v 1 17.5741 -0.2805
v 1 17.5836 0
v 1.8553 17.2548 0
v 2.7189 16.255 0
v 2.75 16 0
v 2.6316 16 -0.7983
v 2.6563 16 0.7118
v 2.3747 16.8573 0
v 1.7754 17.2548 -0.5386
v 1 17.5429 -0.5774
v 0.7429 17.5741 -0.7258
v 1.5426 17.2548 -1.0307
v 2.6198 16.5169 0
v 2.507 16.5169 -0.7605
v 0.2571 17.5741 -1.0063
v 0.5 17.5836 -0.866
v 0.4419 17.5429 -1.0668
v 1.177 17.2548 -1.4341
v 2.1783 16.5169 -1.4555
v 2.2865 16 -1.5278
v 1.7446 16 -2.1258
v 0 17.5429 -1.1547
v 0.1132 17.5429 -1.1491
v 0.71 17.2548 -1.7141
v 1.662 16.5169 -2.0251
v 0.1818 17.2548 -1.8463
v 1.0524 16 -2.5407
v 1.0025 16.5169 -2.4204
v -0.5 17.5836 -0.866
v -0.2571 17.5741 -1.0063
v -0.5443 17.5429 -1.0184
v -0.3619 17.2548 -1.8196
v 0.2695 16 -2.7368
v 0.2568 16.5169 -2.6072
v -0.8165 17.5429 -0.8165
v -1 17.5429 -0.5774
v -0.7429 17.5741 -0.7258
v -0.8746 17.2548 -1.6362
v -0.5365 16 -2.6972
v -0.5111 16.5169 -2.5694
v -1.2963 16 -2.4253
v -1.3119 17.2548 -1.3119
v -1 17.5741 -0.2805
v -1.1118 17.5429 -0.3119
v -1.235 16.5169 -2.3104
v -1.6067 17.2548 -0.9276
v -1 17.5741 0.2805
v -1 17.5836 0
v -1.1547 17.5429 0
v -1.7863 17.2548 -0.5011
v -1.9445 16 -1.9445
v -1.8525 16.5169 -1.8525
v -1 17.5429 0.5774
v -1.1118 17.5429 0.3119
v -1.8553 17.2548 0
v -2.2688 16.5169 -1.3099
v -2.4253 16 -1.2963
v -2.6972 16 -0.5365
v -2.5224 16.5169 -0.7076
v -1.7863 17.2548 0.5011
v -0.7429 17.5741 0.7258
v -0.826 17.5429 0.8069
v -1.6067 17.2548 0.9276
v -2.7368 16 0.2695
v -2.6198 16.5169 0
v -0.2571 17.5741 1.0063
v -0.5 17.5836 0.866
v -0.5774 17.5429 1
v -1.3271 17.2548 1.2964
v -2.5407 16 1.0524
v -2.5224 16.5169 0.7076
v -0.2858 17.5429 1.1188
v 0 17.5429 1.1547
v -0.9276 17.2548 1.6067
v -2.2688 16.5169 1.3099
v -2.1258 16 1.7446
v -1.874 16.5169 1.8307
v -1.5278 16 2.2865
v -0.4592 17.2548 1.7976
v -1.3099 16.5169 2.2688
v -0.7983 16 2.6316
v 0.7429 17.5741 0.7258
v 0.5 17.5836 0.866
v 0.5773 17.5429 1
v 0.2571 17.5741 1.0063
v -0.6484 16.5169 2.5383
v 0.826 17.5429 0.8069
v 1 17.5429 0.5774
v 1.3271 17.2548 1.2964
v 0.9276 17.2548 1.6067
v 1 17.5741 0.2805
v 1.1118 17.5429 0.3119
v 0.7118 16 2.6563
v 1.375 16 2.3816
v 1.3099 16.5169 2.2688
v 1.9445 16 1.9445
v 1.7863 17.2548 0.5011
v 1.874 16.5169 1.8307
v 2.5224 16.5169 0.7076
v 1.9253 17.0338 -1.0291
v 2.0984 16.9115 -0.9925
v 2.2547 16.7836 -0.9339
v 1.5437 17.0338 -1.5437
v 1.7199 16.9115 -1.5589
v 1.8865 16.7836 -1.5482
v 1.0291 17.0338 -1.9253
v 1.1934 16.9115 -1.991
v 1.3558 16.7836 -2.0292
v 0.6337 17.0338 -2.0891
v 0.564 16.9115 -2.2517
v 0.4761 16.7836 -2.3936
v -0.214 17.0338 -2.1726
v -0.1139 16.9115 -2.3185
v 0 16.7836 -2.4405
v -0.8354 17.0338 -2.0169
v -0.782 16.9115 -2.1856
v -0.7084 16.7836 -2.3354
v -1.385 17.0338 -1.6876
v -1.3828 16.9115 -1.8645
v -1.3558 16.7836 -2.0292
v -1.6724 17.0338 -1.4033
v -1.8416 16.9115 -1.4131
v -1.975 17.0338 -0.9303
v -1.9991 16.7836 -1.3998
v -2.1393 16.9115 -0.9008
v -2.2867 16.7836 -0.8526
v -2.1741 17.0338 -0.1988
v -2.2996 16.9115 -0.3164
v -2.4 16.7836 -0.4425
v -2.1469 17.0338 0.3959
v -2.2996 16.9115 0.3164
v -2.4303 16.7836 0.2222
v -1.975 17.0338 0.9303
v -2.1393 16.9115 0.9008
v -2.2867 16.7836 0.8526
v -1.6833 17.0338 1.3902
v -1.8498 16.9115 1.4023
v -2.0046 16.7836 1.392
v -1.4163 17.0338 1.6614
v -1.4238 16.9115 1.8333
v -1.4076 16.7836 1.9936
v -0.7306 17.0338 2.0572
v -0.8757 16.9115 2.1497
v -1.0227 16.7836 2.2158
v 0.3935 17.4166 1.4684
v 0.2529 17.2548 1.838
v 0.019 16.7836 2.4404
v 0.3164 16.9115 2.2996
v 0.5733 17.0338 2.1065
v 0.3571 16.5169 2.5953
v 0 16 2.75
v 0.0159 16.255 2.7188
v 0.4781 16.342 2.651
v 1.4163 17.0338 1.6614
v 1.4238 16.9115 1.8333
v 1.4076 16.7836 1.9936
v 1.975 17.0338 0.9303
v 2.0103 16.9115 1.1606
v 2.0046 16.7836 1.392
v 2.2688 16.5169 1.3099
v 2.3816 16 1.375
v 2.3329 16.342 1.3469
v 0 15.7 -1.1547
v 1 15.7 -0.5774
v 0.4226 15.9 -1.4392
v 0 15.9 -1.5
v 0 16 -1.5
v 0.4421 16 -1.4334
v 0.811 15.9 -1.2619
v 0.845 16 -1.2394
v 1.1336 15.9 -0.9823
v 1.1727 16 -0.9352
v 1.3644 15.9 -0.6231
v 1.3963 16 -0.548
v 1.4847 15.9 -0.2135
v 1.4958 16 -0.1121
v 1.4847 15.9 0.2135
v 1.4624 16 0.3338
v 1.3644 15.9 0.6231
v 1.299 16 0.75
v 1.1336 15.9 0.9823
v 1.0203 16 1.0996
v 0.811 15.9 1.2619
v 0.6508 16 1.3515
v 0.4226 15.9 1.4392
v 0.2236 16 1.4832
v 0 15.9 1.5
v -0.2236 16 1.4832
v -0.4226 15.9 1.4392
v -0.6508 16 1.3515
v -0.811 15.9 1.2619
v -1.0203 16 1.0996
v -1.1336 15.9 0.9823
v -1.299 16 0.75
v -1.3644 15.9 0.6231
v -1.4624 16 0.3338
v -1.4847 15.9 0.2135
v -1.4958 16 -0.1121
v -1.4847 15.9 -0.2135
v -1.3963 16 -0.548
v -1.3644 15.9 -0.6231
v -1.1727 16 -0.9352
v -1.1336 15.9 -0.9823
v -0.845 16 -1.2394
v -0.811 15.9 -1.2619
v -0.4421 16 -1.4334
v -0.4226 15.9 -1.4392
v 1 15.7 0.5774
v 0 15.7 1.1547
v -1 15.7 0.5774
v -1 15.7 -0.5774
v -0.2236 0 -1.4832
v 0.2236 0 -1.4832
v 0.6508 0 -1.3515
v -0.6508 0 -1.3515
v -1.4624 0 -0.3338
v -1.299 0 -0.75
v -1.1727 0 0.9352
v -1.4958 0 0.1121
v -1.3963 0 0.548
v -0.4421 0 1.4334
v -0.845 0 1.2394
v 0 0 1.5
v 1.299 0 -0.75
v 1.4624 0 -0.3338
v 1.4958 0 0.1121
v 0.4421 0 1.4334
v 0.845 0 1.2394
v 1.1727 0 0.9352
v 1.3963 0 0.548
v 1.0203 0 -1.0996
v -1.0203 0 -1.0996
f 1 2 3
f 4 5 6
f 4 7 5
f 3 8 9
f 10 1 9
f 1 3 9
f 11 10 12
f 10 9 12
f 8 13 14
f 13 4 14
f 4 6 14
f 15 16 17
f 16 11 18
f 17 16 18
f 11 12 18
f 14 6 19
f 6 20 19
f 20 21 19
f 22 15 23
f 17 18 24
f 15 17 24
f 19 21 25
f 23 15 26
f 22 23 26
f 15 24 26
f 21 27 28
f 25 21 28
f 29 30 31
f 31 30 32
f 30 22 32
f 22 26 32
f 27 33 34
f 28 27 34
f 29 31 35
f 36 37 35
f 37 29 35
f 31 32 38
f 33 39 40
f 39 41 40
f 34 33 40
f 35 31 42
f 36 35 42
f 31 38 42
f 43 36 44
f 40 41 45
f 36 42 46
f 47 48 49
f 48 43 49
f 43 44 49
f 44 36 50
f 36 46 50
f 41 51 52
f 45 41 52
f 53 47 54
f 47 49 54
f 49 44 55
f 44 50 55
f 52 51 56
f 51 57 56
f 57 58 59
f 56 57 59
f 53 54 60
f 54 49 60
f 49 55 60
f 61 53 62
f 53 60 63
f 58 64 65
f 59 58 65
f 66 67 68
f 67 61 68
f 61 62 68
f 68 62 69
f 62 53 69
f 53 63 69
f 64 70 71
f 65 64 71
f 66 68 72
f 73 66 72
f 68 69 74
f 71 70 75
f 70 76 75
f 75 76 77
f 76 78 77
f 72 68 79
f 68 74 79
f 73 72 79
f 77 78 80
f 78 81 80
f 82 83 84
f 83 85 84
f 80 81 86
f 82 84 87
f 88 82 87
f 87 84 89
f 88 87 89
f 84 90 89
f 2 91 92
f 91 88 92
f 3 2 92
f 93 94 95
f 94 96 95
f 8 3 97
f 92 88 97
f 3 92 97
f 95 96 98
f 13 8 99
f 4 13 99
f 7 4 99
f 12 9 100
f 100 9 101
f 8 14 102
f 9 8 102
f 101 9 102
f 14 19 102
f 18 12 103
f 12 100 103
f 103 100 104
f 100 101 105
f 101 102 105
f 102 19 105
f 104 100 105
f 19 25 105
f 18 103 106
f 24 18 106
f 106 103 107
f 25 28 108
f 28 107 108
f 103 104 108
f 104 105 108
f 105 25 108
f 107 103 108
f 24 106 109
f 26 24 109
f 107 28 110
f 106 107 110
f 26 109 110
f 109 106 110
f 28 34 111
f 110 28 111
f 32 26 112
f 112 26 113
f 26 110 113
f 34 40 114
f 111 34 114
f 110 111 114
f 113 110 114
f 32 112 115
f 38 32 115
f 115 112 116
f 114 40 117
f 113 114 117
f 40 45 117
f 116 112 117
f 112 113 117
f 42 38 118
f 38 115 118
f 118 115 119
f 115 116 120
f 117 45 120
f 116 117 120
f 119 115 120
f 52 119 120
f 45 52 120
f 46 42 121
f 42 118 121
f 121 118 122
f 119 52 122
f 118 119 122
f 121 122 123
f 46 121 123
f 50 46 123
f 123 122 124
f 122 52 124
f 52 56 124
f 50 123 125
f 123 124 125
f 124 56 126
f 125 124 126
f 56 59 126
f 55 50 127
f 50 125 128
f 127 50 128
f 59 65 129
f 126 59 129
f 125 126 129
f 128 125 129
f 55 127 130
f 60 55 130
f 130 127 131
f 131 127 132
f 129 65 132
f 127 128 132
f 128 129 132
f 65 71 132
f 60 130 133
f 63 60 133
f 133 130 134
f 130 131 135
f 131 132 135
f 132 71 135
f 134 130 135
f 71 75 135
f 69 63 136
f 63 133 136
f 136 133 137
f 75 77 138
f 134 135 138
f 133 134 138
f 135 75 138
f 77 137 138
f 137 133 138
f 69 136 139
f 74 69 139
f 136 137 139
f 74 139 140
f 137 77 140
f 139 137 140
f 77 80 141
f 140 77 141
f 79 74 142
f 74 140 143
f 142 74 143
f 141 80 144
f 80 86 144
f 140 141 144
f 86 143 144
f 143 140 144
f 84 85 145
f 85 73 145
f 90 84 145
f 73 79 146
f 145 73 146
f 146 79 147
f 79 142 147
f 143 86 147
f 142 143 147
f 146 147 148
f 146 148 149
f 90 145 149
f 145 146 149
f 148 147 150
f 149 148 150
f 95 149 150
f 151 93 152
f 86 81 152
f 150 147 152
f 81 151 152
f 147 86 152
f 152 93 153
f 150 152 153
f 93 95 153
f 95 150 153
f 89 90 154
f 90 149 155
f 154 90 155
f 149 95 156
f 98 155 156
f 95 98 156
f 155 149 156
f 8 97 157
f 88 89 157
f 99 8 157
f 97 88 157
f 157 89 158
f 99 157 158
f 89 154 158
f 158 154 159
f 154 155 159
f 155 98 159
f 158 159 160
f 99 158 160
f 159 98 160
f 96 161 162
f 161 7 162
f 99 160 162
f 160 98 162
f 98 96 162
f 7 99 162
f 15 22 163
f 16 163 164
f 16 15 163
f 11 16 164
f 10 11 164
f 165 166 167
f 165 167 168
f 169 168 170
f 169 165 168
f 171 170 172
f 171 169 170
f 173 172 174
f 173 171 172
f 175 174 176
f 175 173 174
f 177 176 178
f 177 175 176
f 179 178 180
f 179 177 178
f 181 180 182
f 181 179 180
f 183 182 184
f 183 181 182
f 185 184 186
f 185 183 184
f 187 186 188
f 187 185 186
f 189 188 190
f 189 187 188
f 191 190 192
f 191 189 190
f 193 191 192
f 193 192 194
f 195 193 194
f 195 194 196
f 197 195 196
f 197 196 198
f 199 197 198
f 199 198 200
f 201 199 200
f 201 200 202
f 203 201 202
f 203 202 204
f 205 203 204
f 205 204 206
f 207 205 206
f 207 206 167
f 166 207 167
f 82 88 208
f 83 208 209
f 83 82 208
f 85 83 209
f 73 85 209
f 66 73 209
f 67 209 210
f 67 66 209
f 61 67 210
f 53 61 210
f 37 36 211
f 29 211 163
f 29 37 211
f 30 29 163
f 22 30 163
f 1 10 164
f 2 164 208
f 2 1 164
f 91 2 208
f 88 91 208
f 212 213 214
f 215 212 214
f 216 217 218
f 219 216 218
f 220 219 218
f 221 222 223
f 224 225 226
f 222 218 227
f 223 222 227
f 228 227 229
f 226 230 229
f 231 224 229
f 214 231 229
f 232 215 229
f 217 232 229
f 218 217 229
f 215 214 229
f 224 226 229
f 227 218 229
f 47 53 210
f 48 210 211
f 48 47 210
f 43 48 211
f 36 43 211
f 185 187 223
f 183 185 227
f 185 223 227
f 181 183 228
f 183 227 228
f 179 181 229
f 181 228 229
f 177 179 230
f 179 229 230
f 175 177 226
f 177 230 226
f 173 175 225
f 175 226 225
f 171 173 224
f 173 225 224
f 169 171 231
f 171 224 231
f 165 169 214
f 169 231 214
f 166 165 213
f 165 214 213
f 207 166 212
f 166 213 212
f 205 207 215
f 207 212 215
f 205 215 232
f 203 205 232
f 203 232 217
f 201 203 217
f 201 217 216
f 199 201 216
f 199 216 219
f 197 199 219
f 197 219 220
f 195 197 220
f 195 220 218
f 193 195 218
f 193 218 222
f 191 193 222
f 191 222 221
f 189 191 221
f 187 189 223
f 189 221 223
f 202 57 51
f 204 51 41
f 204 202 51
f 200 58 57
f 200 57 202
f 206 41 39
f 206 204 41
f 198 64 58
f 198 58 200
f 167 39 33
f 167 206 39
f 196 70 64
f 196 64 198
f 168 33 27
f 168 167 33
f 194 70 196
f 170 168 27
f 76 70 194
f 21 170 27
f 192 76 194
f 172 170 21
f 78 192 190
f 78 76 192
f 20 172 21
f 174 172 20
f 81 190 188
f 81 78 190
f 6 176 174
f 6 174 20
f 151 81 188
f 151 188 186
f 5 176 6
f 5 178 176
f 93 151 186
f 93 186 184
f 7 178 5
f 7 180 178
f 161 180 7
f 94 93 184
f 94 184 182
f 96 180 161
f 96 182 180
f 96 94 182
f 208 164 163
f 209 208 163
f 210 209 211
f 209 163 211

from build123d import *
from build123d.topology import SkipClean

# Parameters (mm, degrees)
SKETCH1_R           = 1.5
BOSS_EXTRUDE1_DEPTH = 16
SKETCH2_R           = 2.75
BOSS_EXTRUDE2_DEPTH = 0.1
SKETCH3_R           = 2.75
SKETCH3_R_2         = 1.5
CUT_EXTRUDE1_DEPTH  = 0.1
CUT_EXTRUDE2_DEPTH  = 2


# Read off the part's stored shape, not the designer's step: Dome1
with BuildPart() as part:
    # Sketch1 → Boss-Extrude1 (new body)
    with BuildSketch(Plane(origin=(0, 0, 0), x_dir=(1, 0, 0), z_dir=(0, 1, 0))):
        with Locations(Location((0, 0, 0), (0, 0, 270))):
            Circle(SKETCH1_R)
    extrude(amount=BOSS_EXTRUDE1_DEPTH)

    # Sketch2 → Boss-Extrude2 (add)
    with BuildSketch(Plane(origin=(0, 16, 0), x_dir=(1, 0, 0), z_dir=(0, 1, 0))):
        with Locations(Location((0, 0, 0), (0, 0, 270))):
            Circle(SKETCH2_R)
    extrude(amount=-BOSS_EXTRUDE2_DEPTH)

    # Dome1 outline → Dome1 (revolve)
    with BuildSketch(Plane.XY):
        with BuildLine():
            add(Edge.make_bspline(
                [(0, 17.7), (2.75, 17.7), (2.75, 16)],
                knots=[4.71238898, 4.71238898, 4.71238898, 6.283185307, 6.283185307, 6.283185307], degree=2, weights=[1, 0.707106781, 1]))
            Line((0, 17.7), (0, 16))
            Line((0, 16), (2.75, 16))
        make_face()
    revolve(axis=Axis((0, 0, 0), (0, 1, 0)))

    # Sketch3 → Cut-Extrude1 (cut)
    with SkipClean():  # the faces are left unmerged after this step: merging them gives an invalid solid
        with BuildSketch(Plane.XZ.offset(-15.9)):
            Circle(SKETCH3_R)
            with Locations(Location((0, 0, 0), (0, 0, 270))):
                Circle(SKETCH3_R_2, mode=Mode.SUBTRACT)
        extrude(amount=-CUT_EXTRUDE1_DEPTH, mode=Mode.SUBTRACT)

    # Sketch4 → Cut-Extrude2 (cut)
    with SkipClean():  # the faces are left unmerged after this step: merging them gives an invalid solid
        with BuildSketch(Plane(origin=(0, 17.7, 0), x_dir=(-1, 0, 0), z_dir=(0, -1, 0))):
            Polygon((0, 1.154700538), (-1, 0.577350269), (-1, -0.577350269), (0, -1.154700538), (1, -0.577350269), (1, 0.577350269), align=None)
        extrude(amount=CUT_EXTRUDE2_DEPTH, mode=Mode.SUBTRACT)


solid = part.part
